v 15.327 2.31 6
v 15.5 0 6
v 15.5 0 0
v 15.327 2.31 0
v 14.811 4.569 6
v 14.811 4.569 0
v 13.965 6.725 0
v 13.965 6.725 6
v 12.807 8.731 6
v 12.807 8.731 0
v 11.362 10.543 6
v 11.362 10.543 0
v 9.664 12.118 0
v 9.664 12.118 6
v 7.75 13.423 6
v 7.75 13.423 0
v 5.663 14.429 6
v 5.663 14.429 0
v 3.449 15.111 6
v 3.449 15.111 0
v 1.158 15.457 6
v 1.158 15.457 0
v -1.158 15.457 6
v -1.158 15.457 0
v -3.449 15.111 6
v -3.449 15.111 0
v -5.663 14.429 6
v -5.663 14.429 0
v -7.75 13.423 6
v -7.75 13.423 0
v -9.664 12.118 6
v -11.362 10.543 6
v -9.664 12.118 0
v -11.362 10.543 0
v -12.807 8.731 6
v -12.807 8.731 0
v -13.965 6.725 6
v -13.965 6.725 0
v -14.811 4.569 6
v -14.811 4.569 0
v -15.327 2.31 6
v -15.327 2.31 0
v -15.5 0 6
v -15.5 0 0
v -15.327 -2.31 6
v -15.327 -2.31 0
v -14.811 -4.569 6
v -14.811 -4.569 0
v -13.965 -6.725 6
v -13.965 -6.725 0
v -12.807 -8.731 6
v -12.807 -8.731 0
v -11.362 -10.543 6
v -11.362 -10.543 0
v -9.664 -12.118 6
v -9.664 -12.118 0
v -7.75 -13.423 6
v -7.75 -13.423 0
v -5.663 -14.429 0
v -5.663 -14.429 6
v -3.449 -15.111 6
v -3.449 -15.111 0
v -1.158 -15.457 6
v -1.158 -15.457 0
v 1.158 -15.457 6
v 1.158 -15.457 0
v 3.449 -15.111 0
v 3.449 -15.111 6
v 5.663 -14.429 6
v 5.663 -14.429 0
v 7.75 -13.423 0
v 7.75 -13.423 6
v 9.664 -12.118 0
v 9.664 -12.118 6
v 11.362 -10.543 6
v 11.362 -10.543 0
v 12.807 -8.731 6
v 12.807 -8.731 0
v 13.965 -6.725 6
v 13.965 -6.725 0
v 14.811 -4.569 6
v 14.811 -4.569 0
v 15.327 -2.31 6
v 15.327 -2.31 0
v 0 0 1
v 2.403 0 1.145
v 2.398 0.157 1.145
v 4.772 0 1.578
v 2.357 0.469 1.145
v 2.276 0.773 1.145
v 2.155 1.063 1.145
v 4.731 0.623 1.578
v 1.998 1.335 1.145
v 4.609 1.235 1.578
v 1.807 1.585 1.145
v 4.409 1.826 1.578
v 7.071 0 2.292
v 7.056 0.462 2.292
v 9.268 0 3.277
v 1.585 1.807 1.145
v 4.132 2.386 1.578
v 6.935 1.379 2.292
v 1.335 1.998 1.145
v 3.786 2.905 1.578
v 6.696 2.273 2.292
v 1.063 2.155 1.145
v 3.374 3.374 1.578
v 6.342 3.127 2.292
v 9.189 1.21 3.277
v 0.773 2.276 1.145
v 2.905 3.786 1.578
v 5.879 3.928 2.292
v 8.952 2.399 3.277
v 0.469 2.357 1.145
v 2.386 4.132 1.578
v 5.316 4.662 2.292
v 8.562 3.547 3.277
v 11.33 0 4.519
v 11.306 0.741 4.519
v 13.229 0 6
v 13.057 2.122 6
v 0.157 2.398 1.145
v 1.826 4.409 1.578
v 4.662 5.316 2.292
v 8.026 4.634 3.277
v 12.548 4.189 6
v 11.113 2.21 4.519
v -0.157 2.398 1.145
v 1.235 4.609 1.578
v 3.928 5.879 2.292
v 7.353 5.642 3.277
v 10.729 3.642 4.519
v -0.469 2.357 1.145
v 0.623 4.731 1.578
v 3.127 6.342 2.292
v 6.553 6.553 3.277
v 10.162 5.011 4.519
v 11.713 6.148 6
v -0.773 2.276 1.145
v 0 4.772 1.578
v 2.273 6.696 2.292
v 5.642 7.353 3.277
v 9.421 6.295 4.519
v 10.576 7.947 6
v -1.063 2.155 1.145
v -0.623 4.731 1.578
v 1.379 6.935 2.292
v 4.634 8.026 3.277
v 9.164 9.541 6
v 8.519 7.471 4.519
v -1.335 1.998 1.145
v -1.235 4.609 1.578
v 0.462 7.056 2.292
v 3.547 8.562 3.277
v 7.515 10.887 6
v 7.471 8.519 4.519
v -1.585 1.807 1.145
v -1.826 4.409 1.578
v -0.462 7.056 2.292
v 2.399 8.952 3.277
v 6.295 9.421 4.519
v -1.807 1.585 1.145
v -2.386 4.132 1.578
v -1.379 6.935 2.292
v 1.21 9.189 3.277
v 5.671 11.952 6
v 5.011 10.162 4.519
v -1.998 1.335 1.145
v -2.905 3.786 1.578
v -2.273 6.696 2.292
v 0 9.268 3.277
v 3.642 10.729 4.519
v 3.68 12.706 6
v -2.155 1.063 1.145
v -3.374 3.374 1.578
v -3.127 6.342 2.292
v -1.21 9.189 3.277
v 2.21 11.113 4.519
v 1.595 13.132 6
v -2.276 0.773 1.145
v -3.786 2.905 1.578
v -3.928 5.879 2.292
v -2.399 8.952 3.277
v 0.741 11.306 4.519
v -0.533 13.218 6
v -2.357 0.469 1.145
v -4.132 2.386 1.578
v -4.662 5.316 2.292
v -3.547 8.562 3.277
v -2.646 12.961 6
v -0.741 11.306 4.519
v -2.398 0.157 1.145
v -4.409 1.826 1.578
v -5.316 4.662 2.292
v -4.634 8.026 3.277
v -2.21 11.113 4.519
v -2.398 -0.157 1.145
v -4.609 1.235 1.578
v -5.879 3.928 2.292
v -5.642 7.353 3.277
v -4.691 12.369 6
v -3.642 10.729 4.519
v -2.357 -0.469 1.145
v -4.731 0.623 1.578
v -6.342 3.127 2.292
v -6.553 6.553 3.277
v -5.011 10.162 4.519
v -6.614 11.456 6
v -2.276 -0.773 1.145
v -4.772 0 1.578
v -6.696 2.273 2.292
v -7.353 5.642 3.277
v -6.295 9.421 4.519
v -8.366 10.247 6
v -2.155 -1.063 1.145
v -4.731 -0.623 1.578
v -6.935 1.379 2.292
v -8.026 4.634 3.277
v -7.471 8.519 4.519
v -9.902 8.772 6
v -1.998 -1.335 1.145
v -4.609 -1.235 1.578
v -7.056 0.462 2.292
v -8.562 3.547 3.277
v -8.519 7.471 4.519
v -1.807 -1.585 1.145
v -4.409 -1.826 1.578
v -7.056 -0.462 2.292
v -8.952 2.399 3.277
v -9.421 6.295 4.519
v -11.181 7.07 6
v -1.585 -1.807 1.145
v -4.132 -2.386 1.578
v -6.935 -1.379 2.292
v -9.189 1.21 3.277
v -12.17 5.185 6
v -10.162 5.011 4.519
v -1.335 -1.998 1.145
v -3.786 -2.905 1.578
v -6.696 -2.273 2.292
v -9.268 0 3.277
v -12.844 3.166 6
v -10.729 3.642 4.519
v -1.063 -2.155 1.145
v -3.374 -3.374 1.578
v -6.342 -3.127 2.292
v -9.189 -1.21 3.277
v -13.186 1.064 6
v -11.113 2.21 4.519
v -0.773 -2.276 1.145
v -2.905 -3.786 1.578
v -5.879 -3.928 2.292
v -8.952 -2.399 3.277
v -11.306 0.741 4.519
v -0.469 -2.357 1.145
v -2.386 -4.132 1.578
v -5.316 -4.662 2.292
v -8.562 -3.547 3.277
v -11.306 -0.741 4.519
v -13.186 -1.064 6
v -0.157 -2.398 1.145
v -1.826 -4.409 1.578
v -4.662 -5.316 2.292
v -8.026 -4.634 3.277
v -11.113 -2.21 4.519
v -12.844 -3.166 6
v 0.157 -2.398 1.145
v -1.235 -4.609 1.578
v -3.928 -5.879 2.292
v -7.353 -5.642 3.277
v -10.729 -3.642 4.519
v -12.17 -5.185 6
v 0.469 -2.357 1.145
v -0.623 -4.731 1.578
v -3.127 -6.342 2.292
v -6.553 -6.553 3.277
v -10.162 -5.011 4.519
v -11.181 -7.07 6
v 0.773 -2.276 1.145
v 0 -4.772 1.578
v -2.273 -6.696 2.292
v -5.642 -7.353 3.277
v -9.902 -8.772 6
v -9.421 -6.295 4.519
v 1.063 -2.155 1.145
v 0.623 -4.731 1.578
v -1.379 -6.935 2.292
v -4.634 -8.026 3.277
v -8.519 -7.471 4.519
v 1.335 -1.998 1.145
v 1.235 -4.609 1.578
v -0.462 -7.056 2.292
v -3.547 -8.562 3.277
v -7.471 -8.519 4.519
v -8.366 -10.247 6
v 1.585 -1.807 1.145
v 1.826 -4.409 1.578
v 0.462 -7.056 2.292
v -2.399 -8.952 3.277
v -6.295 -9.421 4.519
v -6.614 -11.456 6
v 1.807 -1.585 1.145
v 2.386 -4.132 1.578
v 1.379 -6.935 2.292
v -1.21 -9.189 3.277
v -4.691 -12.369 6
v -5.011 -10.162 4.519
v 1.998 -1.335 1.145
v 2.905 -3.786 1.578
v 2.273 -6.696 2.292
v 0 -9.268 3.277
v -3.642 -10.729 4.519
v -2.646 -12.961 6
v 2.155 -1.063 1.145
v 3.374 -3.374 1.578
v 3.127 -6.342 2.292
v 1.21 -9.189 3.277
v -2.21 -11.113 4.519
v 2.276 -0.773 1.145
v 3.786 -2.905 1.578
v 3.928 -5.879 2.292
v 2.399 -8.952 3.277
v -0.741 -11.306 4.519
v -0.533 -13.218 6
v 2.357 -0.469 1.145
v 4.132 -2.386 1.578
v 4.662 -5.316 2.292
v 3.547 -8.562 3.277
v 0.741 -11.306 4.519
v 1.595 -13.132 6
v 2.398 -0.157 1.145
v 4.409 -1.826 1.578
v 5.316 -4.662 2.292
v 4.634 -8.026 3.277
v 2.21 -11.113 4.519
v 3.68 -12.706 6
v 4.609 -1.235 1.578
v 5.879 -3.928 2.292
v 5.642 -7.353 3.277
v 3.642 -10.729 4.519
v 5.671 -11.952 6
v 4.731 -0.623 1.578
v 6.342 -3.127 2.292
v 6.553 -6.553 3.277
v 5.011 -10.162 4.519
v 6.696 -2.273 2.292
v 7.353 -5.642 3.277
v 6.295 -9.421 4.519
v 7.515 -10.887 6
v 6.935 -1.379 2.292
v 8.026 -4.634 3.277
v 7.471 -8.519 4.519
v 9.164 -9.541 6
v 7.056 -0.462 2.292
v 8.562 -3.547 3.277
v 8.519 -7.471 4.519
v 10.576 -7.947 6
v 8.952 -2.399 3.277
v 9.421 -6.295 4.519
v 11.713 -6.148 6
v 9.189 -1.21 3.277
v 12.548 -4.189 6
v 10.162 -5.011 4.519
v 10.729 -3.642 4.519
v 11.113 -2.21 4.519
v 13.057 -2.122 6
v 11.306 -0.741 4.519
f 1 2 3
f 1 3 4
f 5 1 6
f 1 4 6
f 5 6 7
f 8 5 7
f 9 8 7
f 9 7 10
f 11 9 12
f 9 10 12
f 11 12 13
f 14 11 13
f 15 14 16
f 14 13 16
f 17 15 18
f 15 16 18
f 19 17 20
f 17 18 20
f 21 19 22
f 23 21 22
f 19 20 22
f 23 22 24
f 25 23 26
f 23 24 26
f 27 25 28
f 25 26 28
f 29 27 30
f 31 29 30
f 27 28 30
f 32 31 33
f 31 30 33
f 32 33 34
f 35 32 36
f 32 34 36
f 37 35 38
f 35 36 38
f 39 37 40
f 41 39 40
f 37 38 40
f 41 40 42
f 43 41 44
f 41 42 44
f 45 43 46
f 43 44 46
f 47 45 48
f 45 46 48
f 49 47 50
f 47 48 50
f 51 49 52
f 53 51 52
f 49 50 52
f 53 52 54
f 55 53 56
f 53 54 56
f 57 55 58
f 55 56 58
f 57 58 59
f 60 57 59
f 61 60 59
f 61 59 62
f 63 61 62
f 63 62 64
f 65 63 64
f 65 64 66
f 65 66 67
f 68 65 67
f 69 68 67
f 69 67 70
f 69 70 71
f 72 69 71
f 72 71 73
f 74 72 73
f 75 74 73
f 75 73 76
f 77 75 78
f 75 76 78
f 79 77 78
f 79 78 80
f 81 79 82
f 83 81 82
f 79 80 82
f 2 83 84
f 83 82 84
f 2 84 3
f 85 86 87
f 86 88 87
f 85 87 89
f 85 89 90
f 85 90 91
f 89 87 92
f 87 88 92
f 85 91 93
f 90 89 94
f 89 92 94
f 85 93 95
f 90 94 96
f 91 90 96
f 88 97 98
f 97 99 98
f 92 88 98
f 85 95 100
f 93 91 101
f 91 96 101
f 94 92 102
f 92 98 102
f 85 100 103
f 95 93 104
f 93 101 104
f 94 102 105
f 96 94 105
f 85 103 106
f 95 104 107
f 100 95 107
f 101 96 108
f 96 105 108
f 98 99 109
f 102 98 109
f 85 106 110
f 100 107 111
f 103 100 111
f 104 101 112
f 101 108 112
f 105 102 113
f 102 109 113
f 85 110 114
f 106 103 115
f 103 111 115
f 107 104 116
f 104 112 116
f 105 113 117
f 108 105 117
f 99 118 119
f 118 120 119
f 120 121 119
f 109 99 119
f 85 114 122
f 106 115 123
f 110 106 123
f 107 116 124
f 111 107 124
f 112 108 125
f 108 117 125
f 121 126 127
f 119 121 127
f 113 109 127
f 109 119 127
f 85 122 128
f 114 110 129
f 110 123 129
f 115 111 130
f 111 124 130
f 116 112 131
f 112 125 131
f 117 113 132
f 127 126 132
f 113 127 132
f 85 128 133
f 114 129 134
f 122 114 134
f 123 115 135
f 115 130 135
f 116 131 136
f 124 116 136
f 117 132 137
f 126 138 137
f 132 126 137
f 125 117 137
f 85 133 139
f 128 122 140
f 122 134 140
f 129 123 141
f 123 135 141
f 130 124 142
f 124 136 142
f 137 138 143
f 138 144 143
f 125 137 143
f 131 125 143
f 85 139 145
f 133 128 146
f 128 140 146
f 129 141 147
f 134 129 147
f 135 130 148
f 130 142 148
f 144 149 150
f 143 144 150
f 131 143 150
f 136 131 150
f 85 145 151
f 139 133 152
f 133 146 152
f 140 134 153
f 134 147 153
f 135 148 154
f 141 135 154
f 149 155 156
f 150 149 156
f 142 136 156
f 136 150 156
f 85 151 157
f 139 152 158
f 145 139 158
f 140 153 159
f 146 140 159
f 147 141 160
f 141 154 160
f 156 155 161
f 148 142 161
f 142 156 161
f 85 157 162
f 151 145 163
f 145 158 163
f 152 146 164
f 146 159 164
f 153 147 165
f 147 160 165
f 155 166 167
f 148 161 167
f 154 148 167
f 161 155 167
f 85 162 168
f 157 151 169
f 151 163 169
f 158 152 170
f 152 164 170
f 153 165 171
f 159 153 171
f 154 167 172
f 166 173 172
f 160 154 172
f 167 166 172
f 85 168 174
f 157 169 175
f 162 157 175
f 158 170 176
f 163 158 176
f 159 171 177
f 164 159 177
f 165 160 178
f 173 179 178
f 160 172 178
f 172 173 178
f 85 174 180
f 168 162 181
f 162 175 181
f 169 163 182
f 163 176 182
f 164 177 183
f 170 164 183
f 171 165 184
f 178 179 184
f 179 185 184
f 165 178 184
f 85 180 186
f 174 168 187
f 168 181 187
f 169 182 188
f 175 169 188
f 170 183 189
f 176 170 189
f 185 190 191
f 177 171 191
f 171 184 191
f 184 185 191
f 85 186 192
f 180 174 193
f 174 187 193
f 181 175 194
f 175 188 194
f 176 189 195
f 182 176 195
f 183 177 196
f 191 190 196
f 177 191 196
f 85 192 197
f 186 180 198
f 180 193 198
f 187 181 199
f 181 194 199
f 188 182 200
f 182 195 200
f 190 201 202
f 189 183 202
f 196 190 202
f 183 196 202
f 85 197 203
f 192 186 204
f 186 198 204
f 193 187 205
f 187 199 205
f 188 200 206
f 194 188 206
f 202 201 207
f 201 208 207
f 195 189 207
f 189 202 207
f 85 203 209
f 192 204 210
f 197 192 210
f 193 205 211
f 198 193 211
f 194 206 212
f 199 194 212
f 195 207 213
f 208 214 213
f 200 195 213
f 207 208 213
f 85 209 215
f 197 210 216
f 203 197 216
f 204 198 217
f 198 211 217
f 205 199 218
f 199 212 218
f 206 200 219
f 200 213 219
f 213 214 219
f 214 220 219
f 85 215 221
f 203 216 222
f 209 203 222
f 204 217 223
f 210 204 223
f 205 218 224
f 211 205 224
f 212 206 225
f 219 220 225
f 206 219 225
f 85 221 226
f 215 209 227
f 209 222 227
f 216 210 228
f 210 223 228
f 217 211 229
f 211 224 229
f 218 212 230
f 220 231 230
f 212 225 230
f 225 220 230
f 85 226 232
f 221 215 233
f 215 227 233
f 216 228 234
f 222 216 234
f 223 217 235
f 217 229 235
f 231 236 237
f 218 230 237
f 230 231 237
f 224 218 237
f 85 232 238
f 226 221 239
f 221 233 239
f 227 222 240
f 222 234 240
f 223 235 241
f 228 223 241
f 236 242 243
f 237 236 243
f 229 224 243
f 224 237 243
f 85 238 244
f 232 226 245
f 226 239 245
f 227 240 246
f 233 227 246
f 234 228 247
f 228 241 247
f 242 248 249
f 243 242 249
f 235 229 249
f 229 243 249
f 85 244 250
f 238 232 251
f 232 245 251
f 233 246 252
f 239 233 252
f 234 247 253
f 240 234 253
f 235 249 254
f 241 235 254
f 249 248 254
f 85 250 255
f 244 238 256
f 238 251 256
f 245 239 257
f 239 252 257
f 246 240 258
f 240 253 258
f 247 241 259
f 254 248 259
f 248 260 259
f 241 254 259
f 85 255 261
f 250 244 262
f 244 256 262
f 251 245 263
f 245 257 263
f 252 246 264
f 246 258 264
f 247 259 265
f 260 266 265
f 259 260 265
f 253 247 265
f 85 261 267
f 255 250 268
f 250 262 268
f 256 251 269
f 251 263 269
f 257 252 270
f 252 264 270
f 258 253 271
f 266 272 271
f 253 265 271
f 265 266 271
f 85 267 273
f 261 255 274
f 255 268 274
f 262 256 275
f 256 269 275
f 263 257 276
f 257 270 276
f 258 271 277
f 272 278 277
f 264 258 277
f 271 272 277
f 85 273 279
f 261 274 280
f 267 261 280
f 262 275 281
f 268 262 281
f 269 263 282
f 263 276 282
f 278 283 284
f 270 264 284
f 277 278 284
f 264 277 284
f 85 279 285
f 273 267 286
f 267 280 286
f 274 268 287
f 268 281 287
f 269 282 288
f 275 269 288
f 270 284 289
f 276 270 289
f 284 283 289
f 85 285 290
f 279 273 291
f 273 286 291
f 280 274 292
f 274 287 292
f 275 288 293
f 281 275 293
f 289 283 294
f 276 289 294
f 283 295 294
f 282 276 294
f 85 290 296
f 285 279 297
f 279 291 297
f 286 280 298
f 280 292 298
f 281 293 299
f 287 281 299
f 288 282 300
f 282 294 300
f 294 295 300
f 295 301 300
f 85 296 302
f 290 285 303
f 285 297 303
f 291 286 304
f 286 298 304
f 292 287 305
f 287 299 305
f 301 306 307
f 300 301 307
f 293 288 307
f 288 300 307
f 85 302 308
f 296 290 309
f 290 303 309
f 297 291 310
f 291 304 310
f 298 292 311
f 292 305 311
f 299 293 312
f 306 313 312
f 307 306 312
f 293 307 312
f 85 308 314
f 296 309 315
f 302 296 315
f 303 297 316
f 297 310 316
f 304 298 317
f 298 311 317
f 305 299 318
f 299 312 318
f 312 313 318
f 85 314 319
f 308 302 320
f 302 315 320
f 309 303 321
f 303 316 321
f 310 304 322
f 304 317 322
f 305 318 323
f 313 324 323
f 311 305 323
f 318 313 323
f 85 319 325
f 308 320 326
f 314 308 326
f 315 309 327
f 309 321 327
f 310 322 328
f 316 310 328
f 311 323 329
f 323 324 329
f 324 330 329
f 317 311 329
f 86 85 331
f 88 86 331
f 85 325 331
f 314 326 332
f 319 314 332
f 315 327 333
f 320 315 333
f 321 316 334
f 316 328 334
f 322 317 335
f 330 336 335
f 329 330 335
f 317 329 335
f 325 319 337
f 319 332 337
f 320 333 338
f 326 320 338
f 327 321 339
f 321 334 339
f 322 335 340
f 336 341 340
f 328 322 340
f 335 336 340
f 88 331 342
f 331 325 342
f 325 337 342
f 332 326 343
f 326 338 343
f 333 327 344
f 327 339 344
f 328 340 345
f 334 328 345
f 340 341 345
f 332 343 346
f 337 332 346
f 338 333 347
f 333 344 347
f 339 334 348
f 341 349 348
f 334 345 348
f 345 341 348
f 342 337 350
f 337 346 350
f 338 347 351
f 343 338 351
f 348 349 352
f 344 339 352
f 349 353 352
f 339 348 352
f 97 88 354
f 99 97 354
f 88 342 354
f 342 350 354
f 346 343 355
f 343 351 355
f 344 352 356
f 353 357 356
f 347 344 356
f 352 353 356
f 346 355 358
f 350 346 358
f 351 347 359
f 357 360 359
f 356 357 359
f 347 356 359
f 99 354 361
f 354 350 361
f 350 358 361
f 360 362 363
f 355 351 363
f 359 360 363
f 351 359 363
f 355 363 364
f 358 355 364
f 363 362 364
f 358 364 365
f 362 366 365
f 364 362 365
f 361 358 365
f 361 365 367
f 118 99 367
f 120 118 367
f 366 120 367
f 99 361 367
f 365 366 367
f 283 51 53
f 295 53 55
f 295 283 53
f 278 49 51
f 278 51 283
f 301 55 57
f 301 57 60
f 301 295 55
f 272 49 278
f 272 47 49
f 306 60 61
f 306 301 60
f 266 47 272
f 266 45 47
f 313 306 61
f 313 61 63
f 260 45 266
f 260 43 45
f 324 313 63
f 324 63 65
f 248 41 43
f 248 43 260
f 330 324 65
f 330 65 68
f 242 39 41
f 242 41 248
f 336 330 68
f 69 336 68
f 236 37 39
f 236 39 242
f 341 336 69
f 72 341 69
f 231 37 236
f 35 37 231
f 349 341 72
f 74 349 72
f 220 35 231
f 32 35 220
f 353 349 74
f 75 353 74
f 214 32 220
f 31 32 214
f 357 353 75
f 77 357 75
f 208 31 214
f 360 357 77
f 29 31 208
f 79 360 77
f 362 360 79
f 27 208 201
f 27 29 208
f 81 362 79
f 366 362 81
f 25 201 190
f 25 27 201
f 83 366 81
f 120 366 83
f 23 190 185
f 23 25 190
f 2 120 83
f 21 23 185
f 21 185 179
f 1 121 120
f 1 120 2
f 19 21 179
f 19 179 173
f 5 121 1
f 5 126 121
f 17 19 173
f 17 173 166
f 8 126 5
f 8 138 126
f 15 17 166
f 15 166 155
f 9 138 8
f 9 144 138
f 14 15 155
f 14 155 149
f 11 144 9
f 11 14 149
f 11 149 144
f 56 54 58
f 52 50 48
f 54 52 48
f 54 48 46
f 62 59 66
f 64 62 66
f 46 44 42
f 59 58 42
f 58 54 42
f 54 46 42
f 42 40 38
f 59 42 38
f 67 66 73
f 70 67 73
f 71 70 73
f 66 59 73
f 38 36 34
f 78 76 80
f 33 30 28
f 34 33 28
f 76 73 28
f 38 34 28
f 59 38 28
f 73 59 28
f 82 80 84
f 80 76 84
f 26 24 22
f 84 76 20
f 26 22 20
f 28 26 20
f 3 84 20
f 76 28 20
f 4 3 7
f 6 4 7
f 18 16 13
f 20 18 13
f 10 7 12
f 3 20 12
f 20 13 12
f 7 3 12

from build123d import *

# Parameters (mm, degrees)
SKETCH_R  = 15.5
PAD_DEPTH = 6


with BuildPart() as sphere:
    # Sphere → Sphere (revolve)
    with BuildSketch(Plane(origin=(0, 0, 21), x_dir=(1, 0, 0), z_dir=(0, -1, 0))):
        with BuildLine():
            ThreePointArc((0, -20), (20, 0), (0, 20))
            Line((0, 20), (0, -20))
        make_face()
    revolve(axis=Axis((0, 0, 21), (0, 0, 1)))


with BuildPart() as cut:
    # Sketch → Pad (new body)
    with BuildSketch(Plane.XY):
        Circle(SKETCH_R)
    extrude(amount=PAD_DEPTH)

    # Cut: cut Sphere
    add(sphere.part, mode=Mode.SUBTRACT)


solid = cut.part
